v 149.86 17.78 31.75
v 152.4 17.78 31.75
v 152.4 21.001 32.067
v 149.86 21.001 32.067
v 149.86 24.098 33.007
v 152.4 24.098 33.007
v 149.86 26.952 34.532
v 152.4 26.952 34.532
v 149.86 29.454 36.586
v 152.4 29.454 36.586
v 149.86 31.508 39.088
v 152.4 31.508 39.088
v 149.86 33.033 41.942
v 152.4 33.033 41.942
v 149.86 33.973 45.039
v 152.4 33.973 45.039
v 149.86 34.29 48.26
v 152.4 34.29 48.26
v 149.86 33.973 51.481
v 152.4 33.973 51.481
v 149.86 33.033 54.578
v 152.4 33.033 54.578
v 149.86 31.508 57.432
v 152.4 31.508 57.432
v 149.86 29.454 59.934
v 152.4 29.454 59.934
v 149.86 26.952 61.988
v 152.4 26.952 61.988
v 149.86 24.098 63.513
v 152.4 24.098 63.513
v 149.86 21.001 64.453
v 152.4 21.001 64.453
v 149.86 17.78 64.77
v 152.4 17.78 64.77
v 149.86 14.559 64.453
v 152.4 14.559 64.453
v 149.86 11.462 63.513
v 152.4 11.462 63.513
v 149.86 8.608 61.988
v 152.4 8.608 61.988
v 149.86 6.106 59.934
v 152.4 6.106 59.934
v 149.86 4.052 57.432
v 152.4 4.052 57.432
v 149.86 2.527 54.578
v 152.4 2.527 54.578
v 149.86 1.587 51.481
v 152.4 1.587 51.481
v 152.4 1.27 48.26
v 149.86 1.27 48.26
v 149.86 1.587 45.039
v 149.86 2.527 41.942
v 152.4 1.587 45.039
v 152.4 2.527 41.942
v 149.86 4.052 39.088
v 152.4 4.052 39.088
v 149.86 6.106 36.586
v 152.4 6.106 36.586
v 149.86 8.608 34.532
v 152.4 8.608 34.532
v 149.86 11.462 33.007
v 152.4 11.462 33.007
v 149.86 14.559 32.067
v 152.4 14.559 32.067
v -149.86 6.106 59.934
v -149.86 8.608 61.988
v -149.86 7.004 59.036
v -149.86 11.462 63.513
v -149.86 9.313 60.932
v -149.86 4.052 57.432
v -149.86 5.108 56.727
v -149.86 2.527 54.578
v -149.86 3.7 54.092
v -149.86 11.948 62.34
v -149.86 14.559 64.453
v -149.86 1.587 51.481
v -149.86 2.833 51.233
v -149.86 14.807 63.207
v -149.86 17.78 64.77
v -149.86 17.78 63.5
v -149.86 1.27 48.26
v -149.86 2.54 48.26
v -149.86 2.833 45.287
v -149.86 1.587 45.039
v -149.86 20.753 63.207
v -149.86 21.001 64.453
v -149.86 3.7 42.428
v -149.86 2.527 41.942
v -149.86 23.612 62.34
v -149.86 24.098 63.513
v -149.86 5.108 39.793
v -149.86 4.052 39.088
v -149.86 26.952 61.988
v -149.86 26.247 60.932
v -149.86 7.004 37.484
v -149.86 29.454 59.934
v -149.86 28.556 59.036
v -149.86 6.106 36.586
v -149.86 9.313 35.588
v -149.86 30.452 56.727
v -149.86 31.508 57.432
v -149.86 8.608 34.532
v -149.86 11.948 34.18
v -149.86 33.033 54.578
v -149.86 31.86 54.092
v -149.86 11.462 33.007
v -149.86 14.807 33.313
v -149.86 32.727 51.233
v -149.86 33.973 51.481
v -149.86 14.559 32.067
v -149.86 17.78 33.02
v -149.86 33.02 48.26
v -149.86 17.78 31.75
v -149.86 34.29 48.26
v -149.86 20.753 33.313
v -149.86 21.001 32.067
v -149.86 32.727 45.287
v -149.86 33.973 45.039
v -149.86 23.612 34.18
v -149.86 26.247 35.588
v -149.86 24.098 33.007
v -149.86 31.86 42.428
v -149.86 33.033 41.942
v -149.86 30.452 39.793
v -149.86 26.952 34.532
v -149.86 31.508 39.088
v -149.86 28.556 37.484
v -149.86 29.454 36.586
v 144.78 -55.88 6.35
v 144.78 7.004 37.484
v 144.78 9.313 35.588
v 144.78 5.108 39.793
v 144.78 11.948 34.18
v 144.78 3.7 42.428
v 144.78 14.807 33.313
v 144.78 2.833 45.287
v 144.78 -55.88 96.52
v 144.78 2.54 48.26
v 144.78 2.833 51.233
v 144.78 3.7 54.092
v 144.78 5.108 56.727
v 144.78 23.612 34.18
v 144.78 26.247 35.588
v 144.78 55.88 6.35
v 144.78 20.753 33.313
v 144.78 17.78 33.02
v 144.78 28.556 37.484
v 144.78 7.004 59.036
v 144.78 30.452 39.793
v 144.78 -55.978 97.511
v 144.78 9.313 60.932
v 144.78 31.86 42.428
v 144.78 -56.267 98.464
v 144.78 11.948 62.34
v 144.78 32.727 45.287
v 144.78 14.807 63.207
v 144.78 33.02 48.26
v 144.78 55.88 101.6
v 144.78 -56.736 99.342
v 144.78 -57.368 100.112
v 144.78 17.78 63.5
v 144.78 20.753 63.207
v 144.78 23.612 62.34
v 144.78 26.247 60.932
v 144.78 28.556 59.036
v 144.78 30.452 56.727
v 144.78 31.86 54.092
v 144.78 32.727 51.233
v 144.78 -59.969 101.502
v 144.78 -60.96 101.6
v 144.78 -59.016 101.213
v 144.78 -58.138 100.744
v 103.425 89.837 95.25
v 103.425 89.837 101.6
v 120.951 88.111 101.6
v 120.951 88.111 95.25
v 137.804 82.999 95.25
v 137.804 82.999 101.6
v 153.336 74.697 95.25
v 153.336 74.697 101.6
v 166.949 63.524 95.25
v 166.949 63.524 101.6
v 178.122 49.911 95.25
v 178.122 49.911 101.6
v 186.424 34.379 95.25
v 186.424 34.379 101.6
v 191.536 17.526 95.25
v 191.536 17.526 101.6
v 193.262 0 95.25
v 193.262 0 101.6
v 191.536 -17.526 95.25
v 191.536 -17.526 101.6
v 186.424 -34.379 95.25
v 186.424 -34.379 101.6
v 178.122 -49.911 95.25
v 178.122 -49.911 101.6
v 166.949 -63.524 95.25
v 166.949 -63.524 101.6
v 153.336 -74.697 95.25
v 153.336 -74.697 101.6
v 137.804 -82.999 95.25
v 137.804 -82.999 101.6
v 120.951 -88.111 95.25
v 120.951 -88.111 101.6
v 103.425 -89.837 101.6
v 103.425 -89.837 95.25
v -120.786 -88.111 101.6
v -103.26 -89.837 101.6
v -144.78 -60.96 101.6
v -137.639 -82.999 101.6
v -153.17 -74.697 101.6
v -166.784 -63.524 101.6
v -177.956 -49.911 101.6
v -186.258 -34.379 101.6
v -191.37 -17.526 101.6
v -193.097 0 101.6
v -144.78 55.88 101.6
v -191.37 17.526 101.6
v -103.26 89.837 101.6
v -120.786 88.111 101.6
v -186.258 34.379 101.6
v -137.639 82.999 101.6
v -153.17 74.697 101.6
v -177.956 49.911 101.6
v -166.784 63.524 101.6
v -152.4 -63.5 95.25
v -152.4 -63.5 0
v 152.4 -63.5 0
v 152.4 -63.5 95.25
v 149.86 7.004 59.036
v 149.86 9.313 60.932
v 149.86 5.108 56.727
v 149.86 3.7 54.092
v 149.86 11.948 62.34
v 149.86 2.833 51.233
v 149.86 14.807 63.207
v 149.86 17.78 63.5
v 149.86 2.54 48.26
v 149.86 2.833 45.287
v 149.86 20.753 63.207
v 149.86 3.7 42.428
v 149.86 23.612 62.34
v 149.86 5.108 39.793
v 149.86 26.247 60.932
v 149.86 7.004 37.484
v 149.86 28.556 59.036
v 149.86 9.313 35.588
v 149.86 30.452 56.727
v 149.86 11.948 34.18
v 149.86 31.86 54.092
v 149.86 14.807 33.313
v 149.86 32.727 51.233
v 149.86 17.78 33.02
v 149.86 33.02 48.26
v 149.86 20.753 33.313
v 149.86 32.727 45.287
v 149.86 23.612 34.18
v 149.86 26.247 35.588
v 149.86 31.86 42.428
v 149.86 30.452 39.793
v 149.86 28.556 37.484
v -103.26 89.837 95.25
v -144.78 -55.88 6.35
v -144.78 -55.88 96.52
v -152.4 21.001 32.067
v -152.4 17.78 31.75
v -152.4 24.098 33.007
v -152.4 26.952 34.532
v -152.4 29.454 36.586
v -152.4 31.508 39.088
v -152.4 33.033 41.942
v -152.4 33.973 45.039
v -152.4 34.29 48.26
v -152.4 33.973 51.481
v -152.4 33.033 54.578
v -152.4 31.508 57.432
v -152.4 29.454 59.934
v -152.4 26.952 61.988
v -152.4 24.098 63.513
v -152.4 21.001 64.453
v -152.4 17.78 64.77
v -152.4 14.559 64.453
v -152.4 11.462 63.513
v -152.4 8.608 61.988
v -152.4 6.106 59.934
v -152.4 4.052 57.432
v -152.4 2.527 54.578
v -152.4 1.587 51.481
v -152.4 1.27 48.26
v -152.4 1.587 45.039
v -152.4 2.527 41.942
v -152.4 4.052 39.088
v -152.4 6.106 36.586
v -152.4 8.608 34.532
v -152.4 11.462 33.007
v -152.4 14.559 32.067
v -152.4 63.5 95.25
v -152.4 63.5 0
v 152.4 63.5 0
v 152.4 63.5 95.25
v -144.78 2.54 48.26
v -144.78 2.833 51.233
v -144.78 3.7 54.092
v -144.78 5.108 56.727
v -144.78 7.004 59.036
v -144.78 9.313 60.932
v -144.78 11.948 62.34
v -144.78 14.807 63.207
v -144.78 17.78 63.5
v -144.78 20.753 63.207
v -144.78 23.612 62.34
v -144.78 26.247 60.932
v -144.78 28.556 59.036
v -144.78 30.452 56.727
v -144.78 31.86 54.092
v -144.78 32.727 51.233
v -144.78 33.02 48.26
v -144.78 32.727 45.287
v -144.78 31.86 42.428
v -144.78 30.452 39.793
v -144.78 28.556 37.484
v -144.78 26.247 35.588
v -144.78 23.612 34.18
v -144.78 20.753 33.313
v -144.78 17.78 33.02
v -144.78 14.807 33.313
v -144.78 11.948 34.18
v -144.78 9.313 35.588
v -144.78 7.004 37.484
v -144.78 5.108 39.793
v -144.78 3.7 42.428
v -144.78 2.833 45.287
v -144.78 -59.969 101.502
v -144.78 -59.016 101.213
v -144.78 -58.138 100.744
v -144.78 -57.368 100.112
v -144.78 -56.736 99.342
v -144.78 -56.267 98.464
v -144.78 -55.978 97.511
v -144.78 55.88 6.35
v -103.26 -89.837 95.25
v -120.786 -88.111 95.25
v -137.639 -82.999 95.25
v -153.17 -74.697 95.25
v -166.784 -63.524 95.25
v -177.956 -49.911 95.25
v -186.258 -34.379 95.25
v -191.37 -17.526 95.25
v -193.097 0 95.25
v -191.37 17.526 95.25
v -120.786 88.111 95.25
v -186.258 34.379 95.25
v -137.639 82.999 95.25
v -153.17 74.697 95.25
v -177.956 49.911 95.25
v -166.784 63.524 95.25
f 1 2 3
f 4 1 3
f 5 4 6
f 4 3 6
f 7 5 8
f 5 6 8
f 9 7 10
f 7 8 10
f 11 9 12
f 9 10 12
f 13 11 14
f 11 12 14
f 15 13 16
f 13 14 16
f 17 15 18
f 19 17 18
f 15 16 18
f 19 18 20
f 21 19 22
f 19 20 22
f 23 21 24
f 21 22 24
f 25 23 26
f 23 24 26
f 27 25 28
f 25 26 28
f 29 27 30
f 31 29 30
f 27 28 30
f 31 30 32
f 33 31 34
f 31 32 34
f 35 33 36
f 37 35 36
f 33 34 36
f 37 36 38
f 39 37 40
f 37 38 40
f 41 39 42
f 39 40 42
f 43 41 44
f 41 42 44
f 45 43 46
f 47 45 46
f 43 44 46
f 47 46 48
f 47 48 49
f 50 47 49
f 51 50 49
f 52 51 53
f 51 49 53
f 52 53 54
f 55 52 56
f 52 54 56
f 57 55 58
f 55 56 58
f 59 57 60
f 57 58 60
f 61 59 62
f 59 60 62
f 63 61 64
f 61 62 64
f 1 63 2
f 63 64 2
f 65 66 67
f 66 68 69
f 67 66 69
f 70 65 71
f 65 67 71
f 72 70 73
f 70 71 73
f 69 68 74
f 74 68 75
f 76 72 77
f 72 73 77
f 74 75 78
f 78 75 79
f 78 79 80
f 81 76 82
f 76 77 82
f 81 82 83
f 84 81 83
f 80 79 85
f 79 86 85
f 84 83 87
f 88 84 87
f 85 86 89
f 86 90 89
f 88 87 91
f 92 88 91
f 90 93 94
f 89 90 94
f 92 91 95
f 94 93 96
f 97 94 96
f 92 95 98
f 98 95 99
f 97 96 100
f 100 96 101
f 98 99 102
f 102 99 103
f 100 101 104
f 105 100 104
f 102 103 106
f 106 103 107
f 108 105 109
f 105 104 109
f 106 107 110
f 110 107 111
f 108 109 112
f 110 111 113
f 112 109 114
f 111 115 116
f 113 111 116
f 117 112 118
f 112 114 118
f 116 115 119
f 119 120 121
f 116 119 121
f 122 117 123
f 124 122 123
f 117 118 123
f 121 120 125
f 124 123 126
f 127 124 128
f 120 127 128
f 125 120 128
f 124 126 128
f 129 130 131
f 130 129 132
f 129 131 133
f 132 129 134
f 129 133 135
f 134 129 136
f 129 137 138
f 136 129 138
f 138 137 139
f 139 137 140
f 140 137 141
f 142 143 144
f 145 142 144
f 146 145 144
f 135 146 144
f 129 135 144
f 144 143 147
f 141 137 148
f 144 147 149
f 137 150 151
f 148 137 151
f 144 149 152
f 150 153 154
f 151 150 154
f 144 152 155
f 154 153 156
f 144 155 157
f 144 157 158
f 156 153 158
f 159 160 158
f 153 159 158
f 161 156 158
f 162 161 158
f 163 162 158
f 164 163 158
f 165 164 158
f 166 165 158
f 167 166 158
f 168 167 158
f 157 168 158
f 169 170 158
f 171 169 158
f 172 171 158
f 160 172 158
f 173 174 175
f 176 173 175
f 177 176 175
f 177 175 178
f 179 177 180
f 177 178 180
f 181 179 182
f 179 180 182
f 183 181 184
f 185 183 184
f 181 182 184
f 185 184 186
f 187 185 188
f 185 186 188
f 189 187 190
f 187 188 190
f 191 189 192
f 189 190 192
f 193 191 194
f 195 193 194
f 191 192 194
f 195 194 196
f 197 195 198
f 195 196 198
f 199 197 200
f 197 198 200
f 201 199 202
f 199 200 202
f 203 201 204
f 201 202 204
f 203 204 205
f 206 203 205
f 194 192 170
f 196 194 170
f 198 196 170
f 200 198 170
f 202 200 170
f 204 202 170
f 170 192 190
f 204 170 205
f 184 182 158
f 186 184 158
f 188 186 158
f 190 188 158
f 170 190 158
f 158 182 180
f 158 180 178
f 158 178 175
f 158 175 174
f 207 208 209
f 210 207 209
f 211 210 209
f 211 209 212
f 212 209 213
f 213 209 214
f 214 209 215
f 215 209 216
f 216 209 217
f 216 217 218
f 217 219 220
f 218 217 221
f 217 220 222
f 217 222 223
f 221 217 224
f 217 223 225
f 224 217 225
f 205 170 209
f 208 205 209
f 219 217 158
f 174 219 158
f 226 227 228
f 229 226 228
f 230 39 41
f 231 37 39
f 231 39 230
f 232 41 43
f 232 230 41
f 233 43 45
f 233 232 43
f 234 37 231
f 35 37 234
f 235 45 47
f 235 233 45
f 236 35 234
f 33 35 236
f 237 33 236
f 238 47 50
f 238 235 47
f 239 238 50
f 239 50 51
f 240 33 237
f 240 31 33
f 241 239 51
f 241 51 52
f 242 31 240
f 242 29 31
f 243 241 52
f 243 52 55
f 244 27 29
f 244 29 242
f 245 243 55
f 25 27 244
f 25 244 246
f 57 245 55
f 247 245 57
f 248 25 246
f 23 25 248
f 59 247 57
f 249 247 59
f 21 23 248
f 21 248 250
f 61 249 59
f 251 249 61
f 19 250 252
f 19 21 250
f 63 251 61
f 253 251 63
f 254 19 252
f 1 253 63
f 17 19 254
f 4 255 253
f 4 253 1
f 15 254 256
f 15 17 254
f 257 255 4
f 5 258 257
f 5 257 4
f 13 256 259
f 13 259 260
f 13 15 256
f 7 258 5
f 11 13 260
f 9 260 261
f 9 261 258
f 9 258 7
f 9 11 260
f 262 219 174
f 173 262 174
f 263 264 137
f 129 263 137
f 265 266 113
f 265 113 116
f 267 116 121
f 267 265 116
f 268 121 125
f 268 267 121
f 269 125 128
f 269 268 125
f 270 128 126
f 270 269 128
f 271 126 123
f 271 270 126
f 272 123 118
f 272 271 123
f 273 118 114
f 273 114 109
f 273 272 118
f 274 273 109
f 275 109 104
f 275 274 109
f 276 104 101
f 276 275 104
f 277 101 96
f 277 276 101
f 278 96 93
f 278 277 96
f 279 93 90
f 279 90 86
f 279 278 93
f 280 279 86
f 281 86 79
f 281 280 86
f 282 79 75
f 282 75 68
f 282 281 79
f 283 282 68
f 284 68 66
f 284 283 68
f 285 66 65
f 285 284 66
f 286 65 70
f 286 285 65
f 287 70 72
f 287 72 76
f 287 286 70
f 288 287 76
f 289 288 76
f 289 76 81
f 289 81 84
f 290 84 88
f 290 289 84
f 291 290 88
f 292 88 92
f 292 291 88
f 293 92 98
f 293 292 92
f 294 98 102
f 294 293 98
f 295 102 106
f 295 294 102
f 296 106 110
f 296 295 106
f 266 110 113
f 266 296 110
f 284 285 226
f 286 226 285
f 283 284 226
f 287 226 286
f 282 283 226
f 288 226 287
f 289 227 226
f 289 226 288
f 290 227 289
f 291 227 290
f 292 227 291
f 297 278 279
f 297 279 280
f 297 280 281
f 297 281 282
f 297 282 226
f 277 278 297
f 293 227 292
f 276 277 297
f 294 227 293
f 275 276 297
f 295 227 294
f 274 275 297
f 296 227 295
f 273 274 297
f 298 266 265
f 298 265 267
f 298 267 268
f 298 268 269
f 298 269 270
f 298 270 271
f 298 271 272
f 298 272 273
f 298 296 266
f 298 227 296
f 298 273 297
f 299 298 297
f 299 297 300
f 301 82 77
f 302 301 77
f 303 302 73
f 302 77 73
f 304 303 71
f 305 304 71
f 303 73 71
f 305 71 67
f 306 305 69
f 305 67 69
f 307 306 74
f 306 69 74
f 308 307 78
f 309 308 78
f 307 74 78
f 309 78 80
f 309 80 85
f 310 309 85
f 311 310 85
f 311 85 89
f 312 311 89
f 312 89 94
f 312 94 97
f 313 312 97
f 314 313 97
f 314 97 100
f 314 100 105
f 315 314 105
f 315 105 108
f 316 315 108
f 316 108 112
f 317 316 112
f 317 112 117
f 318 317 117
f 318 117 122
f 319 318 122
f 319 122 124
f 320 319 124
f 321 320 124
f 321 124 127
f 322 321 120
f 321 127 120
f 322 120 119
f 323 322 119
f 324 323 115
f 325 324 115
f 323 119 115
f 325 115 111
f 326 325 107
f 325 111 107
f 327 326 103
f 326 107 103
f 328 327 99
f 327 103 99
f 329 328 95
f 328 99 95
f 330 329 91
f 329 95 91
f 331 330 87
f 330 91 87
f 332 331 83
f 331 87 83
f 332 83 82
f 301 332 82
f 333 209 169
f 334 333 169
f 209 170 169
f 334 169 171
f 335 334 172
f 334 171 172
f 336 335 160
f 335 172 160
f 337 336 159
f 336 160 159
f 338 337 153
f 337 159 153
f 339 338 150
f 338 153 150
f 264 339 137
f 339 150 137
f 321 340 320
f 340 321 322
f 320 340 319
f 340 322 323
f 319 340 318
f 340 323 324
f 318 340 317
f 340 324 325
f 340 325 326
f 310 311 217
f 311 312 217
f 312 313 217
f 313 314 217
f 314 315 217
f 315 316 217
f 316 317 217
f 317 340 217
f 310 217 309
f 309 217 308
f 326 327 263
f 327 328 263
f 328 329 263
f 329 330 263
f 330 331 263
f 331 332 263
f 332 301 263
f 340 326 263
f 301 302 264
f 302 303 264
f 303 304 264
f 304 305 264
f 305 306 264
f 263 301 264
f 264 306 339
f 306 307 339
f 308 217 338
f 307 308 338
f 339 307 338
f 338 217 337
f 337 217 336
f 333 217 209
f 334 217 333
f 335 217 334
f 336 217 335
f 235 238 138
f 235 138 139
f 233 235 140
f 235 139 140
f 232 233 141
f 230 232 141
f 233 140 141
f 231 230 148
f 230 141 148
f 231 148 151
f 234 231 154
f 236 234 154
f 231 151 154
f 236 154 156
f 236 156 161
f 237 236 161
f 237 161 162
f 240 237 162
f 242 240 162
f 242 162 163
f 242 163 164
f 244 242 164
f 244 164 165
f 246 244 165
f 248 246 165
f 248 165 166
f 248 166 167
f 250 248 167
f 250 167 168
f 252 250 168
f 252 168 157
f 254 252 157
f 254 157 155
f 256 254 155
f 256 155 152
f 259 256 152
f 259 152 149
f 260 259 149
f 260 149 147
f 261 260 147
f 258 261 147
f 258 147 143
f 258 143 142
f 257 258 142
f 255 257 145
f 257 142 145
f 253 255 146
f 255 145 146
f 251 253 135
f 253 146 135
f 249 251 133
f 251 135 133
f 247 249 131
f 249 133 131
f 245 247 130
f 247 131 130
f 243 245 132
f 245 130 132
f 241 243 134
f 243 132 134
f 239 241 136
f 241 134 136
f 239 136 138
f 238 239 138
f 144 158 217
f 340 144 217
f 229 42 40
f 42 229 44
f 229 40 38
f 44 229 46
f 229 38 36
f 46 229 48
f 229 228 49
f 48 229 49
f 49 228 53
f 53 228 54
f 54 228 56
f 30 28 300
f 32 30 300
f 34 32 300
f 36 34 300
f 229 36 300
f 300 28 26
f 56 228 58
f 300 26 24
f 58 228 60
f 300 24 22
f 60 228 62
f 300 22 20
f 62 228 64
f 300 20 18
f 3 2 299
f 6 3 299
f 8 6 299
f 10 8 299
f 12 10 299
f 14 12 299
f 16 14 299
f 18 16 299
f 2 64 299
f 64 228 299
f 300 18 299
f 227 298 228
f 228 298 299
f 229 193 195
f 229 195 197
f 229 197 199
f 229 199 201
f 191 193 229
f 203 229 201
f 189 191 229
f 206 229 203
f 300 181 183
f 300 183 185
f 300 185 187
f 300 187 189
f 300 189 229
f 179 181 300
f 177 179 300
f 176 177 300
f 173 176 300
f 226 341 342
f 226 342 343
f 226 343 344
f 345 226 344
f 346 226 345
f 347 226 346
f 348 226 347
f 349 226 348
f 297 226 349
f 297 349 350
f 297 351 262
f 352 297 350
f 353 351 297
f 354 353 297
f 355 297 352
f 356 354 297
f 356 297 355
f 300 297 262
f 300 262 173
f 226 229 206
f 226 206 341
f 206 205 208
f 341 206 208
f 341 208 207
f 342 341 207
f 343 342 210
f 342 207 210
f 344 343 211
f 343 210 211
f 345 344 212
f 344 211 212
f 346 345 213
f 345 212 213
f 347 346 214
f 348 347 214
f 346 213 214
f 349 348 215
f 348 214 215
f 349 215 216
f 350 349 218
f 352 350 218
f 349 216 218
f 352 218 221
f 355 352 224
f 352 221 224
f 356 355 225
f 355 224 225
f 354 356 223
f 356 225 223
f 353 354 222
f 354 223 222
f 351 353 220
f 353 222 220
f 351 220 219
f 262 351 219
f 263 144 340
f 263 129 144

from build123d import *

# Parameters (mm, degrees)
SKETCH1_W           = 304.8
SKETCH1_H           = 127
BOSS_EXTRUDE1_DEPTH = 101.6
CUT_EXTRUDE2_DEPTH  = 95.25
SKETCH3_W           = 289.56
SKETCH3_H           = 111.76
BOSS_EXTRUDE2_DEPTH = 6.35
SKETCH5_R           = 15.24
CUT_EXTRUDE4_DEPTH  = 372.316040041
FILLET2_R           = 5.08
SKETCH6_R           = 16.51
CUT_EXTRUDE5_DEPTH  = 2.54


with BuildPart() as part:
    # Sketch1 → Boss-Extrude1 (new body)
    with BuildSketch(Plane.XY):
        Rectangle(SKETCH1_W, SKETCH1_H)
    extrude(amount=BOSS_EXTRUDE1_DEPTH)

    # 3DSketch1 → Cut-Extrude2 (cut)
    with BuildSketch(Plane(origin=(144.78, 55.88, 101.6), x_dir=(-0.9329231300425795, -0.36007559405152184, 0), z_dir=(0, 0, 1))):
        Polygon((0, 0), (270.137221535, -104.263489014), (310.379269926, 0), (40.242048391, 104.263489014), align=None)
    extrude(amount=-CUT_EXTRUDE2_DEPTH, mode=Mode.SUBTRACT)

    # Sketch3 → Boss-Extrude2 (add)
    with BuildSketch(Plane.XY.offset(101.6)):
        with BuildLine():
            Line((-103.259510137, 89.837120171), (103.425046446, 89.837120171))
            ThreePointArc((103.425046446, 89.837120171), (193.262166618, 0), (103.425046446, -89.837120171))
            Line((103.425046446, -89.837120171), (-103.259510137, -89.837120171))
            ThreePointArc((-103.259510137, -89.837120171), (-193.096630308, 0), (-103.259510137, 89.837120171))
        make_face()
        Rectangle(SKETCH3_W, SKETCH3_H, mode=Mode.SUBTRACT)
    extrude(amount=-BOSS_EXTRUDE2_DEPTH)

    # Sketch5 → Cut-Extrude4 (cut, through all)
    with BuildSketch(Plane.ZY.offset(152.4)):
        with Locations(Location((48.26, 17.78, 0), (0, 0, 270))):
            Circle(SKETCH5_R)
    extrude(amount=-CUT_EXTRUDE4_DEPTH, mode=Mode.SUBTRACT)

    # Fillet2
    fillet2_edges = [part.edges().sort_by_distance(p)[0] for p in [
        (0, -55.88, 101.6),
    ]]
    fillet(fillet2_edges, radius=FILLET2_R)

    # Sketch6 → Cut-Extrude5 (cut)
    with BuildSketch(Plane(origin=(152.4, 0, 0), x_dir=(0, 0, -1), z_dir=(1, 0, 0))):
        with Locations((-48.26, 17.78)):
            Circle(SKETCH6_R)
    cut_extrude5 = extrude(amount=-CUT_EXTRUDE5_DEPTH, mode=Mode.SUBTRACT)

    # Mirror1: Cut-Extrude5 across plane
    add(cut_extrude5.mirror(Plane(origin=(0, 0, 0), x_dir=(0, 0, 1), z_dir=(1, 0, 0))), mode=Mode.SUBTRACT)


solid = part.part
